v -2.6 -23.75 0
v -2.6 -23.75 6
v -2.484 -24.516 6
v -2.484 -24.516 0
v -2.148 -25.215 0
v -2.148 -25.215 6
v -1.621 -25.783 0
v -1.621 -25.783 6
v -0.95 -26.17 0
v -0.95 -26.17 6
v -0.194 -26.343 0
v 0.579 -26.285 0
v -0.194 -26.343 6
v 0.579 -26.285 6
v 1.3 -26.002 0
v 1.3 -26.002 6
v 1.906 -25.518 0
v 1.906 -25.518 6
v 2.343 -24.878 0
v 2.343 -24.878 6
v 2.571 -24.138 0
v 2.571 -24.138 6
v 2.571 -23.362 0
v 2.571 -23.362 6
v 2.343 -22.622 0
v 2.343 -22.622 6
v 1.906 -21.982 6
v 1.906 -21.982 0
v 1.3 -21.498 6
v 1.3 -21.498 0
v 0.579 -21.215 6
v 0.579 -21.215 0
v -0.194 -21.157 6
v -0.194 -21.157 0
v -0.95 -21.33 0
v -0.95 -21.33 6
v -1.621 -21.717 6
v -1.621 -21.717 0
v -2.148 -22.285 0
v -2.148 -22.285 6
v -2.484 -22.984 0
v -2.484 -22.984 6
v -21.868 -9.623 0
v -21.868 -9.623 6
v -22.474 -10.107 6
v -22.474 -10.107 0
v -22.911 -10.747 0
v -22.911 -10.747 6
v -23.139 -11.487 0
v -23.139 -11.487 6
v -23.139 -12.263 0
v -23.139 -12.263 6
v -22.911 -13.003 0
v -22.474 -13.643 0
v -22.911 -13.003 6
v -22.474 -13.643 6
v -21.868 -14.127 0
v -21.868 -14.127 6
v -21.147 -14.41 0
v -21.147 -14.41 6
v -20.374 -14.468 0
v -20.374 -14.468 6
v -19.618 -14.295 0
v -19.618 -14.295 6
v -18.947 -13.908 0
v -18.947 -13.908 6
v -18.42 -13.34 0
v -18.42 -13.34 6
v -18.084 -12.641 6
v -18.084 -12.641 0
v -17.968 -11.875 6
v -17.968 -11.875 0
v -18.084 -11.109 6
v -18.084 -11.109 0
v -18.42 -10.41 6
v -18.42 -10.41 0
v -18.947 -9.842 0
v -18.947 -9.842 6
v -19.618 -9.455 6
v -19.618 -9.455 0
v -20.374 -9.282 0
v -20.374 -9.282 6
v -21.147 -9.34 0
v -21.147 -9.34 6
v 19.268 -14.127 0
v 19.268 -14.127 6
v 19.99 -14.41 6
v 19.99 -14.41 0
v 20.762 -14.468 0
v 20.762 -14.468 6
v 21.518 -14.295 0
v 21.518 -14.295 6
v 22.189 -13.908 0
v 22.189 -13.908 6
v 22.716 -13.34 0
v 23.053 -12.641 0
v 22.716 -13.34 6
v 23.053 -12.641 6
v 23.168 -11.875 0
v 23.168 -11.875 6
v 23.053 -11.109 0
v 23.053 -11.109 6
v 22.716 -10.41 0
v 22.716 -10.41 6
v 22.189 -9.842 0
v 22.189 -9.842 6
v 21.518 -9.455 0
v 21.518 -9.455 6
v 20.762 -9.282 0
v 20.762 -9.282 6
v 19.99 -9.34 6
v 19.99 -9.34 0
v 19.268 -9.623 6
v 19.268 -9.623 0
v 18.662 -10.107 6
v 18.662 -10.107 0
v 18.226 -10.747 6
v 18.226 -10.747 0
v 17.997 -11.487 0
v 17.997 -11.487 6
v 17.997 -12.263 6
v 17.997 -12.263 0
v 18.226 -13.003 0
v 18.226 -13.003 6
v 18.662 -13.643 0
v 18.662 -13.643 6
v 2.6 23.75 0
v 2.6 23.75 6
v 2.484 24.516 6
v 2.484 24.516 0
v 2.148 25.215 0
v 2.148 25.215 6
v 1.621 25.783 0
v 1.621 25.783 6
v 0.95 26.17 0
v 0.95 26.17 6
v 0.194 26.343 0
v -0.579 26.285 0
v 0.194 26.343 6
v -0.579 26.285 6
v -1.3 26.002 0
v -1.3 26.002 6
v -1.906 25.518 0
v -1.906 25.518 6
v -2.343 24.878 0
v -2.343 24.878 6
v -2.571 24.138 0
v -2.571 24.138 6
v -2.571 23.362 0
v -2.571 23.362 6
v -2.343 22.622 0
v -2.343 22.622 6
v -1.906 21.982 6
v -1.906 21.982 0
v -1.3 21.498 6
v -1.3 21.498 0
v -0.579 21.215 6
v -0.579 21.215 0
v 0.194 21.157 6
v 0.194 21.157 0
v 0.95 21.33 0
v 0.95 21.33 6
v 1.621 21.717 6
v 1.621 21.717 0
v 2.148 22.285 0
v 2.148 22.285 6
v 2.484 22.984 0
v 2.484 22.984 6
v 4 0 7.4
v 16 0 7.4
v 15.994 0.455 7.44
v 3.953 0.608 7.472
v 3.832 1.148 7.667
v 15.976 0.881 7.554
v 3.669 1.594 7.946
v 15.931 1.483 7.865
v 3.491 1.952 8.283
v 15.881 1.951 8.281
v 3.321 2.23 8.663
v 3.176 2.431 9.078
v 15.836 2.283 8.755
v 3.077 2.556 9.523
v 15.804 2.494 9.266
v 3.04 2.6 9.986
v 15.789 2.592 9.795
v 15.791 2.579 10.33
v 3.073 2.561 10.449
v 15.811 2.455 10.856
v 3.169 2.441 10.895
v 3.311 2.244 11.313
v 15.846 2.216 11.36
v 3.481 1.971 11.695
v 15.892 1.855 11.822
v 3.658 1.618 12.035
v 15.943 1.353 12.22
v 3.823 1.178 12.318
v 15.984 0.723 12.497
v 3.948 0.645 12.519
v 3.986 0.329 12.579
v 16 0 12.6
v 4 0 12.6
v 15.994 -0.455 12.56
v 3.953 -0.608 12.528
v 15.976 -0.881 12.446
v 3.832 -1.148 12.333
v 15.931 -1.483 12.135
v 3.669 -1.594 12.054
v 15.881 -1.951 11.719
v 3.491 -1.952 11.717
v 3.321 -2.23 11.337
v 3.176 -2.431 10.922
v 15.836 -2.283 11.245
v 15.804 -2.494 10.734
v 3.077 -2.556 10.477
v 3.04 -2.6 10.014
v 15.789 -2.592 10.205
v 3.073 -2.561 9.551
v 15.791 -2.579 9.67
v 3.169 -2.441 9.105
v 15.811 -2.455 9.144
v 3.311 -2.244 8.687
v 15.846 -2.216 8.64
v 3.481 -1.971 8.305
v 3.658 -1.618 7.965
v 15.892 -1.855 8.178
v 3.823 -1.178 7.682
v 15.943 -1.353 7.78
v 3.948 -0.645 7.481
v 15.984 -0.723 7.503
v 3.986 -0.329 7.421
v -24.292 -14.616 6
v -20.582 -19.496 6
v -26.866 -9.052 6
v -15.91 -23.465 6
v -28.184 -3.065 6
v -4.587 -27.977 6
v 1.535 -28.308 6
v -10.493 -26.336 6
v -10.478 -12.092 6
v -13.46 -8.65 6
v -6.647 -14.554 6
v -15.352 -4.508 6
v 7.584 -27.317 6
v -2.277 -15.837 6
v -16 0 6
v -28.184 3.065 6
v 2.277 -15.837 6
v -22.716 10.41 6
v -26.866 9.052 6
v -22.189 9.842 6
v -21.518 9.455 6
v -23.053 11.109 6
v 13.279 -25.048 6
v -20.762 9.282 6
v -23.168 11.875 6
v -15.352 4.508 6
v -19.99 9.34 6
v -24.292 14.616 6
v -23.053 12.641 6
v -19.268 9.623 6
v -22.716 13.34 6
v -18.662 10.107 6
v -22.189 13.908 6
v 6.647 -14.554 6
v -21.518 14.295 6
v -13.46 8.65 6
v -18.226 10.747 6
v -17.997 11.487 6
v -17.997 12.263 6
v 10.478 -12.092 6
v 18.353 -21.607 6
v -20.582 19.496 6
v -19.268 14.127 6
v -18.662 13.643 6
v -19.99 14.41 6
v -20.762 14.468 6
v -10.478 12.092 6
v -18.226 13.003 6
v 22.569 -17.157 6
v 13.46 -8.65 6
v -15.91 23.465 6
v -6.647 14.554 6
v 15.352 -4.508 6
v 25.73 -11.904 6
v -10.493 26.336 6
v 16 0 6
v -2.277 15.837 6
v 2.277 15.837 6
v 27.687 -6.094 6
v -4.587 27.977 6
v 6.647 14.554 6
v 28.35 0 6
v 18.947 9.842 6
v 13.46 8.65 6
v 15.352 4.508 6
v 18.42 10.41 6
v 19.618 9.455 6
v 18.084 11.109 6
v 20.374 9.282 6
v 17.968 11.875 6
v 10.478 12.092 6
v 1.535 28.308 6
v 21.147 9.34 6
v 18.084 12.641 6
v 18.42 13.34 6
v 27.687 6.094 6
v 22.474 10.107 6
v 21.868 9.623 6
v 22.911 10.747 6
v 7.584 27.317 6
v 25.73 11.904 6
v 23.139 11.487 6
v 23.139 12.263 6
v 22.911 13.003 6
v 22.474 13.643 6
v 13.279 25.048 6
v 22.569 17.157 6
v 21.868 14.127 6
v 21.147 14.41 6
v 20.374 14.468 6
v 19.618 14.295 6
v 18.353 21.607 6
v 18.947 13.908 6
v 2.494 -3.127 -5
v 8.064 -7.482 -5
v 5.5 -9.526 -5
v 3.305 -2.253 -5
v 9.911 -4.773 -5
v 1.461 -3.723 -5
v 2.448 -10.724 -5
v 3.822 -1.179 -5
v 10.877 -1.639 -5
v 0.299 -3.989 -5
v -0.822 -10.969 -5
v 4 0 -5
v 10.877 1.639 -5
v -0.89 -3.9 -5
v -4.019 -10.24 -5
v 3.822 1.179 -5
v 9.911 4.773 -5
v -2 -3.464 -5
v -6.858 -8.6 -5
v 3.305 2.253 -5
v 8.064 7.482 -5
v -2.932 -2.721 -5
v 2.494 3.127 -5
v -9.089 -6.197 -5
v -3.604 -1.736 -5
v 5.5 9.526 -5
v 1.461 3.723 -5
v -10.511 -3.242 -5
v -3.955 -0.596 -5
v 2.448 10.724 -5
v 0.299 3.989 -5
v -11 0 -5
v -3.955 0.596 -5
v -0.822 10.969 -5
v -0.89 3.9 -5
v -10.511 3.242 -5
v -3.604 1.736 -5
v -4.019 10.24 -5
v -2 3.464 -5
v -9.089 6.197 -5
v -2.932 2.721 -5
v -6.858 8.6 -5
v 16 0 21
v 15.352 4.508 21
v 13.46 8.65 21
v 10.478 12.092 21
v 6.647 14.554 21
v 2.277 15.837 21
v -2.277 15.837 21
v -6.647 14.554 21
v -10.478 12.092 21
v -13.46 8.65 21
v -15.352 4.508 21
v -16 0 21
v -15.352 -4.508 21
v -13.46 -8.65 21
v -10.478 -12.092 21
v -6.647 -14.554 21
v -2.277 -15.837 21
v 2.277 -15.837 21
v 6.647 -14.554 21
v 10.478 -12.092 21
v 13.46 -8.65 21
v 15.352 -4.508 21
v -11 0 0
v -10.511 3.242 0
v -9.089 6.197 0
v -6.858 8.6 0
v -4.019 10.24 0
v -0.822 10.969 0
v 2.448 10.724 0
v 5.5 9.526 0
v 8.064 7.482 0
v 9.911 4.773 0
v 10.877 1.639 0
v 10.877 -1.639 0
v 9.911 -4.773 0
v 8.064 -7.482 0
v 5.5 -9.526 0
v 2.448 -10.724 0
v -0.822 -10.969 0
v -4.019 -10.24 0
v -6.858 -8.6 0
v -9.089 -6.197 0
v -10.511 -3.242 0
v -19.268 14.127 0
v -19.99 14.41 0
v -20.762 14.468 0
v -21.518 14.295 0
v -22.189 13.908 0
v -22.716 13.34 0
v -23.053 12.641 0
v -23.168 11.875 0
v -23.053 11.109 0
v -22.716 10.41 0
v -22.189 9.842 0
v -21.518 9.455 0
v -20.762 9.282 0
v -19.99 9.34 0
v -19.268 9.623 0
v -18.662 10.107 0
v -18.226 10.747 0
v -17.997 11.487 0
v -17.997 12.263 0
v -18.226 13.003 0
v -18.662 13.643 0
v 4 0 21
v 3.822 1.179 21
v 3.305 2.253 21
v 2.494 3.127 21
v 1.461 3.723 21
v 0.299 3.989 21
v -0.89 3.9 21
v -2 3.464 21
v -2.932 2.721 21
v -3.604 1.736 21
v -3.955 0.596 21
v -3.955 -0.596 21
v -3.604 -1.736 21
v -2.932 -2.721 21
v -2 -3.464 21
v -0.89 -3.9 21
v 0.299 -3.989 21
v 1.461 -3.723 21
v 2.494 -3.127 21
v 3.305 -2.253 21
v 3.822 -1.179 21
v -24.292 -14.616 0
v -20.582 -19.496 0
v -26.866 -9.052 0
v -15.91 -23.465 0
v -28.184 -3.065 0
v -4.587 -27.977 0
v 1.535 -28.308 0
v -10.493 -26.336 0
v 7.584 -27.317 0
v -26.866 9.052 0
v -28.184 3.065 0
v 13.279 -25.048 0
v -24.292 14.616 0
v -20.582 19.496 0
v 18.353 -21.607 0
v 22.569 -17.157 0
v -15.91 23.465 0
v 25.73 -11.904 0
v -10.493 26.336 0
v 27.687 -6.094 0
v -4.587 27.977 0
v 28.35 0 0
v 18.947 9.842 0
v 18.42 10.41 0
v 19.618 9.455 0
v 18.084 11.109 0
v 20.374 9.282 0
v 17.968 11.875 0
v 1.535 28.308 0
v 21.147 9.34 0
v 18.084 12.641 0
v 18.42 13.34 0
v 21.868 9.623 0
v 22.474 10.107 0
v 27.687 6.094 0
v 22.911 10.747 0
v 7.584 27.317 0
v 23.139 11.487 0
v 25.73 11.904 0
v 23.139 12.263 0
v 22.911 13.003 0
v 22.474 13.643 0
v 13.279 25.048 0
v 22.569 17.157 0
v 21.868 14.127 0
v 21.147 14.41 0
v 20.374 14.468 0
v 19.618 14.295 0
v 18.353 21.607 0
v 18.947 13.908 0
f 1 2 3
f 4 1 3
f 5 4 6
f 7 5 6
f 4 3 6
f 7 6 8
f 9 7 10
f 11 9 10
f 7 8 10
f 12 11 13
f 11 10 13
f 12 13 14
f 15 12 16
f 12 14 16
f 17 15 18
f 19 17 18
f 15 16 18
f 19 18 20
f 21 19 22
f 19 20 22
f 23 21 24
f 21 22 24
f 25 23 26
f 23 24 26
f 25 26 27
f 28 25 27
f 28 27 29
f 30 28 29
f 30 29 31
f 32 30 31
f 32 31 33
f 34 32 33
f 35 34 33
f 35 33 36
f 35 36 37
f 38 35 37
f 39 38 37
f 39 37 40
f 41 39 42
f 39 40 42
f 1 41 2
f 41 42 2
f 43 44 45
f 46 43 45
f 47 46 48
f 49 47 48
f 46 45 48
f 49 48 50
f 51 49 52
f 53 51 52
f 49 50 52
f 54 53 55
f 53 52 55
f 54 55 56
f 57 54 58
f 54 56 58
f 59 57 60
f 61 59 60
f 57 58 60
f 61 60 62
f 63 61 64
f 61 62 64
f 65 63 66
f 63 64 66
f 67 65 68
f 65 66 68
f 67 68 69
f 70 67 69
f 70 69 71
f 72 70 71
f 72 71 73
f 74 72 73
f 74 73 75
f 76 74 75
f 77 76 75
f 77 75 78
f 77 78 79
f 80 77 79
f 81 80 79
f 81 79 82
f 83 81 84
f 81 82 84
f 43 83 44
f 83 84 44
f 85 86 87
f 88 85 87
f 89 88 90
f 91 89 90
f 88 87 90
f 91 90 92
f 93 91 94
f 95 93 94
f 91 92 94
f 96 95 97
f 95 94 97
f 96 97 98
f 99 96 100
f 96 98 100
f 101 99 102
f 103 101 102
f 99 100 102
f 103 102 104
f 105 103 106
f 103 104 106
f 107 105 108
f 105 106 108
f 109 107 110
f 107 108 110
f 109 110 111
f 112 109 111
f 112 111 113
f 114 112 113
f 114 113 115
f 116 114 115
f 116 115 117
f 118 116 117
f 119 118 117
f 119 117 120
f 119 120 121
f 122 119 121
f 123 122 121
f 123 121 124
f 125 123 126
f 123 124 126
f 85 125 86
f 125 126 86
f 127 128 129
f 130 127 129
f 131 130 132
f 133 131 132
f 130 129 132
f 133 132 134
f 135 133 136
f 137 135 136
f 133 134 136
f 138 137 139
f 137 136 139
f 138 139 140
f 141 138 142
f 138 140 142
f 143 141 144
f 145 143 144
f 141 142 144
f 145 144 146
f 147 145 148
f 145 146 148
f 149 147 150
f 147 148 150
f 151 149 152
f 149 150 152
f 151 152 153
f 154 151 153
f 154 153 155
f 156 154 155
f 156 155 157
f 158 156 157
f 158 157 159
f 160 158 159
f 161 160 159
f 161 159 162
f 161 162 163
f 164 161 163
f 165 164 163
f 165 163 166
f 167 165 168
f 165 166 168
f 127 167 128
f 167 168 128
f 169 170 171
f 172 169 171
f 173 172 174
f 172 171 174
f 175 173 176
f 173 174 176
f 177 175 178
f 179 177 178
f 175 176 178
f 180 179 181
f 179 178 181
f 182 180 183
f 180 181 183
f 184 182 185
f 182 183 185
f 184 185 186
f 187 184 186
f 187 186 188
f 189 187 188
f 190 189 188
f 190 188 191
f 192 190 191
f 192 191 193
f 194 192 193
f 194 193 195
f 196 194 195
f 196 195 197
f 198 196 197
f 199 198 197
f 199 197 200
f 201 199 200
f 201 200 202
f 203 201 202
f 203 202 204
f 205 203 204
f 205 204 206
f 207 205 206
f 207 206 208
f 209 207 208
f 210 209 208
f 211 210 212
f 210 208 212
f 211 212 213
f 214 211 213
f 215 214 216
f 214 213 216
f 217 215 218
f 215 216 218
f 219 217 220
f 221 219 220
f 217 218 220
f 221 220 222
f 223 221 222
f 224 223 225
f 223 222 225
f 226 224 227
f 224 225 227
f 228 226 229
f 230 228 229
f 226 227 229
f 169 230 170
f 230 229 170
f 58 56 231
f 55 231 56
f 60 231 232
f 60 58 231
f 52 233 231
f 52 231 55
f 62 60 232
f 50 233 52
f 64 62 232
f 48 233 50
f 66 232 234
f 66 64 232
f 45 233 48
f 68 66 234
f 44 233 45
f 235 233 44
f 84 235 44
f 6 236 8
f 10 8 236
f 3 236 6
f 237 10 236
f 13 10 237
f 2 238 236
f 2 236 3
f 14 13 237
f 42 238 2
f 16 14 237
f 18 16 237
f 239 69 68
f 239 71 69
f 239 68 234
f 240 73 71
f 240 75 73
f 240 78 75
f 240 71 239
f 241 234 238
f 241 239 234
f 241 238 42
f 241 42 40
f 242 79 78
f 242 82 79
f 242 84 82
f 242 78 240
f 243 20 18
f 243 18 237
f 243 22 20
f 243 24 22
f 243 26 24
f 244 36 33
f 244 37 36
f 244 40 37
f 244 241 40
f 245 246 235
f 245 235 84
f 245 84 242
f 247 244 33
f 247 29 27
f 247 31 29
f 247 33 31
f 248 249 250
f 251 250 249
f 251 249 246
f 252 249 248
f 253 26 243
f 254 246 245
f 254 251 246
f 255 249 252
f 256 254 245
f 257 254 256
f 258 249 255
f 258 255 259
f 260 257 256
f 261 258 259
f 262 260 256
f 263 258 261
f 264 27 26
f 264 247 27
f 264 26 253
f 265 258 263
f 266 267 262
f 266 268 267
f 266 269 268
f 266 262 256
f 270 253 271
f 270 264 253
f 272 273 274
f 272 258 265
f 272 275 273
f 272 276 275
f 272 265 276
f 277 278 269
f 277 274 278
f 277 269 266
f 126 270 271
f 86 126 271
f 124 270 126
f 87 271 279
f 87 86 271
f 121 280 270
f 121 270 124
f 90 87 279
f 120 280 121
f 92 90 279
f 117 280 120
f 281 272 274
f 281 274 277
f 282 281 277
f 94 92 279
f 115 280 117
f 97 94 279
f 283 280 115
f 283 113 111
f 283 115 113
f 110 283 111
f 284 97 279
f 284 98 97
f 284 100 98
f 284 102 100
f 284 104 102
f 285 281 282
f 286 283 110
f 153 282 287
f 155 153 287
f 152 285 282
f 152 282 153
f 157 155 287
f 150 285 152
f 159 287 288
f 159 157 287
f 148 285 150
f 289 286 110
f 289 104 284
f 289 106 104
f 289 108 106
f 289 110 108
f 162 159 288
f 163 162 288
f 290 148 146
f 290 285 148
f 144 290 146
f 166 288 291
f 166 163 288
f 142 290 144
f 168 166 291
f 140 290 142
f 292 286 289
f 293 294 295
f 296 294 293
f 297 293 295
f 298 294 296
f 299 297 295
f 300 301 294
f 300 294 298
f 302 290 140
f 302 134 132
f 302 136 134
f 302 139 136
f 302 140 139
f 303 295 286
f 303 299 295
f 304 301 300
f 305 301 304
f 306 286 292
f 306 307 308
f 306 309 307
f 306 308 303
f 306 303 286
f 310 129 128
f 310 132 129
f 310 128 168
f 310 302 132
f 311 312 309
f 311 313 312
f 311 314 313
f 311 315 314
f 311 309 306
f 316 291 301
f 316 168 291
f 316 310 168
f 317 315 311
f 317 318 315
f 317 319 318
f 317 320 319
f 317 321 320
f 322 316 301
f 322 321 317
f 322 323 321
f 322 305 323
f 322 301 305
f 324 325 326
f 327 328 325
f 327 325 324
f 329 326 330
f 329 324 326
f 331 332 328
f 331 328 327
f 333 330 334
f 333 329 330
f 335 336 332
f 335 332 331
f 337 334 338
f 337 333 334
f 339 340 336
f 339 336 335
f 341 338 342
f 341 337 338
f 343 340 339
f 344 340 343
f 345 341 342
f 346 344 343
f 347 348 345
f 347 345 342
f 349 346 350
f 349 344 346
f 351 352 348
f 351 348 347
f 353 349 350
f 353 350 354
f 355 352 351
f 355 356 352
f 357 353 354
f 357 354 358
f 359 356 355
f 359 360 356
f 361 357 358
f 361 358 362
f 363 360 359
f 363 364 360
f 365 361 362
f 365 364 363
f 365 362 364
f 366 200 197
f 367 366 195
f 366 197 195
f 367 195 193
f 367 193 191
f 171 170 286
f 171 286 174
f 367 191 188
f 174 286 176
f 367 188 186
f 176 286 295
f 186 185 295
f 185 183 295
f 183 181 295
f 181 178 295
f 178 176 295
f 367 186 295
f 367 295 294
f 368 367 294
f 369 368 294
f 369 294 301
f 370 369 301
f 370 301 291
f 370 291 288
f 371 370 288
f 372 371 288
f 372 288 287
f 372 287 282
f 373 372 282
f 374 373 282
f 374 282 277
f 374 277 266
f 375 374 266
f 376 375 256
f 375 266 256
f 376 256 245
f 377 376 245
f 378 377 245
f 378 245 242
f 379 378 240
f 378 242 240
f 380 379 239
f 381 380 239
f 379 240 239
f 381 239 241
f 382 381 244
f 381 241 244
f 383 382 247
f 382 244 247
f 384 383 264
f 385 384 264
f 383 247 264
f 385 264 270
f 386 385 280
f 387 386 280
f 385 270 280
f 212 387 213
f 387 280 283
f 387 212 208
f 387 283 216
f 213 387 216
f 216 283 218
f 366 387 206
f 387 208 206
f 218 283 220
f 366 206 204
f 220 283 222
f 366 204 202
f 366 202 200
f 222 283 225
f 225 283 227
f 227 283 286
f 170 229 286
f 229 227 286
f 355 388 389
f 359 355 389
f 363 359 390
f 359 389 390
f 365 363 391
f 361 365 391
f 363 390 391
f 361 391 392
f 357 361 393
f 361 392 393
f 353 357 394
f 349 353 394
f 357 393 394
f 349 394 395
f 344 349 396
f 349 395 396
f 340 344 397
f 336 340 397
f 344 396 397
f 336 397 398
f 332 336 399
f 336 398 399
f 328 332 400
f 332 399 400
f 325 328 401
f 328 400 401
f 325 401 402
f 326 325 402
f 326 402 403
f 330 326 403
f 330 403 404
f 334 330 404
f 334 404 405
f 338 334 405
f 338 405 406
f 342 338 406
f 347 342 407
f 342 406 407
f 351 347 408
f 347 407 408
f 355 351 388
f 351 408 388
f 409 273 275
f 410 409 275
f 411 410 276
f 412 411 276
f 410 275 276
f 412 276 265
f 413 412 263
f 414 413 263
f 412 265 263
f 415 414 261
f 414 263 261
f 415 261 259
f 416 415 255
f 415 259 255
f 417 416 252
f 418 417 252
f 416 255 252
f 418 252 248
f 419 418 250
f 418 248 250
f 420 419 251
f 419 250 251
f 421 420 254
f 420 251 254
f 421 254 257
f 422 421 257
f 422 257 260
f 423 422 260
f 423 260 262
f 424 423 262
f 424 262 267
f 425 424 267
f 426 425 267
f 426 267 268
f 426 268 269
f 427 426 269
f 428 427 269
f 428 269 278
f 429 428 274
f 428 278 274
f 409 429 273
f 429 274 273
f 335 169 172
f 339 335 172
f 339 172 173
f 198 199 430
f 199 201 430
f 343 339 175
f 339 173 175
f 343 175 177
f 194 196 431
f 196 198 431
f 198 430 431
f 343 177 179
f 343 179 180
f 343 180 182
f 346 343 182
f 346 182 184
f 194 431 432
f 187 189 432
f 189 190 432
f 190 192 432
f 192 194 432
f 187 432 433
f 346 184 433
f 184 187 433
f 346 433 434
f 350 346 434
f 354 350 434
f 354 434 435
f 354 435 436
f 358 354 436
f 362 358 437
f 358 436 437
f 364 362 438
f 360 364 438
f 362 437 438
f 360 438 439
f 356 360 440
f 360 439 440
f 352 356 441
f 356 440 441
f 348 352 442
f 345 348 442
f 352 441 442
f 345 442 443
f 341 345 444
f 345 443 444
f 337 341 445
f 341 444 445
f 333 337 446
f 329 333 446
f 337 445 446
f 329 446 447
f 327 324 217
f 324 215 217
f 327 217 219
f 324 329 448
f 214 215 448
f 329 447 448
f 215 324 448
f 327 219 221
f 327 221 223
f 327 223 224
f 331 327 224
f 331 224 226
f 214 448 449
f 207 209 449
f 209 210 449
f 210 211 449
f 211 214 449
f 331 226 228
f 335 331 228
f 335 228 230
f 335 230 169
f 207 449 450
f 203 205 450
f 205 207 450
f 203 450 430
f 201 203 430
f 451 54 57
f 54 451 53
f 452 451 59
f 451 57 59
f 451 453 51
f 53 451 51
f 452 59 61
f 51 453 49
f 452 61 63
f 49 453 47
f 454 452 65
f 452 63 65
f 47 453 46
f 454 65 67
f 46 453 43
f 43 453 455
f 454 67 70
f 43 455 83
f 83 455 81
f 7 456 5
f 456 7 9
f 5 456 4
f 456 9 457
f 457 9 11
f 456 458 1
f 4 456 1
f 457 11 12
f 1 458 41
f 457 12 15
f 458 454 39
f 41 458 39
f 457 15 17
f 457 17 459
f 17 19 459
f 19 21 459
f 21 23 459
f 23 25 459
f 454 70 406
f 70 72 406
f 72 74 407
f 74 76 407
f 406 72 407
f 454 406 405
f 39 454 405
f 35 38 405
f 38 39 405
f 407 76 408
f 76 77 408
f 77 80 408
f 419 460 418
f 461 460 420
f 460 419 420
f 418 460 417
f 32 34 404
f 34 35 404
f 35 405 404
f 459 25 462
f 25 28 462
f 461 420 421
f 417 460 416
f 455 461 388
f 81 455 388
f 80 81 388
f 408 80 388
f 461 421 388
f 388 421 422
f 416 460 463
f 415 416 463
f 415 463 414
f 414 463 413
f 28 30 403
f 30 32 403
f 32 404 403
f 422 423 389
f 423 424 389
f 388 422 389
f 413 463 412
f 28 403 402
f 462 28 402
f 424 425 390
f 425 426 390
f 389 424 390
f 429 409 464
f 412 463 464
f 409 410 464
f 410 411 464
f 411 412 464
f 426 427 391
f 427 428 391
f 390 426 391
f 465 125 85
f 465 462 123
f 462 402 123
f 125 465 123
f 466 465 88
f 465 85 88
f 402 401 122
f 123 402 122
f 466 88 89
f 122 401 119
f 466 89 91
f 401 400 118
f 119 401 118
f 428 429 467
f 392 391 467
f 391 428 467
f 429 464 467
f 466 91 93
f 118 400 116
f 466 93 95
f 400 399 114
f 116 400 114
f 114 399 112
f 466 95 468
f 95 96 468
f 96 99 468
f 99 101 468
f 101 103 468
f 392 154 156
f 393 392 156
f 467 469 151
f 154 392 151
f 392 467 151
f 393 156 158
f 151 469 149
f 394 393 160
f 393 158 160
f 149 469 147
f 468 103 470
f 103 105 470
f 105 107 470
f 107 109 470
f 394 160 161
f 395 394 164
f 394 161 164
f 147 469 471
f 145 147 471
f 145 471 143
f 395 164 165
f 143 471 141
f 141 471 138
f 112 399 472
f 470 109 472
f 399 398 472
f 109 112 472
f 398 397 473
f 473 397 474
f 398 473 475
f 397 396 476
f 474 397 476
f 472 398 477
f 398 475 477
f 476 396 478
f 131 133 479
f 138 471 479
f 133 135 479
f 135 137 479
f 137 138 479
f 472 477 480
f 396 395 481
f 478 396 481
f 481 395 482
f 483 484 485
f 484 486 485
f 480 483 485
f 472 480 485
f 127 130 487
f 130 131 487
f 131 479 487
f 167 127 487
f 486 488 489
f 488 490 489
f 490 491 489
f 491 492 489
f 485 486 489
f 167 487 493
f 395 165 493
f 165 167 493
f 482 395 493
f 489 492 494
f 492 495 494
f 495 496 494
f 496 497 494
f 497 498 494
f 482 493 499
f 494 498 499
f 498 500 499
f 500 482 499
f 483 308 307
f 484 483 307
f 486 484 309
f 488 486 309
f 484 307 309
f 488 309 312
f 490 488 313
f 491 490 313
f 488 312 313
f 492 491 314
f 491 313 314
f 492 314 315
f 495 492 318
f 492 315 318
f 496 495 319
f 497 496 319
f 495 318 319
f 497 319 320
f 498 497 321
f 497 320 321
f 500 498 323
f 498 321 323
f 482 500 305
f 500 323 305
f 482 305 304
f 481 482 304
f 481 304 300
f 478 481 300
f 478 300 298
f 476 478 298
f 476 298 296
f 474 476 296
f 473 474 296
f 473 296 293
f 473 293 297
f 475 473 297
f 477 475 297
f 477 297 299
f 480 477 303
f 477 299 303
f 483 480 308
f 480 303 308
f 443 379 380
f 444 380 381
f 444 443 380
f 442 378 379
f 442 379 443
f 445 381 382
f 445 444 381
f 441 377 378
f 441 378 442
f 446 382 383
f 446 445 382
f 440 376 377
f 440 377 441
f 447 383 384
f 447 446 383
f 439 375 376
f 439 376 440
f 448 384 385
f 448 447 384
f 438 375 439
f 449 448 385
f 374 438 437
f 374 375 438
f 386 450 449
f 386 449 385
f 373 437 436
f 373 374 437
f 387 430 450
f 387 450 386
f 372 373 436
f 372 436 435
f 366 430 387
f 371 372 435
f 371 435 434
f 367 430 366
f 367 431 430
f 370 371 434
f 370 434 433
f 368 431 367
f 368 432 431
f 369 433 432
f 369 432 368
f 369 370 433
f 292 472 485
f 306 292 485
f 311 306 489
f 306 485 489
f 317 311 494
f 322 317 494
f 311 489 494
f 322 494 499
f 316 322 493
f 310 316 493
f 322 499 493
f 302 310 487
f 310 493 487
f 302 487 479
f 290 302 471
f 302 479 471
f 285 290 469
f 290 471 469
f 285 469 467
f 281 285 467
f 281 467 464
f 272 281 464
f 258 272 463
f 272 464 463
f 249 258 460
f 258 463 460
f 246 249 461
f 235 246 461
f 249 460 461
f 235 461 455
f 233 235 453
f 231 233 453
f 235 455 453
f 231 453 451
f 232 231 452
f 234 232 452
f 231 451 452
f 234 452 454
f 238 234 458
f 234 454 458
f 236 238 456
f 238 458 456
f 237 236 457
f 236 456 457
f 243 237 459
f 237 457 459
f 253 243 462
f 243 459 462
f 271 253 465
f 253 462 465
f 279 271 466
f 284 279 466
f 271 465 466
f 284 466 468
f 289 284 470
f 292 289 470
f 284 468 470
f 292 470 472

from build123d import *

# Parameters (mm, degrees)
SKETCH_1_R               = 28.35
EXTRUDE_1_DEPTH          = 6
SKETCH_2_R               = 16
EXTRUDE_2_DEPTH          = 15
SKETCH_7_R               = 11
EXTRUDE_3_DEPTH          = 5
SKETCH_3_R               = 4
CUT_EXTRUDE_1_DEPTH      = 48.785405722
CUT_EXTRUDE_2_REACH      = 44.807
SKETCH_4_R               = 2.6
PATTERN_CIRCULAR_1_COUNT = 6
CUT_EXTRUDE_3_REACH      = 58.671
SKETCH_6_R               = 2.6


with BuildPart() as part:
    # 草圖1 → 填料-伸長1 (new body)
    with BuildSketch(Plane.XY):
        Circle(SKETCH_1_R)
    extrude(amount=EXTRUDE_1_DEPTH)

    # 草圖2 → 填料-伸長2 (add)
    with BuildSketch(Plane.XY.offset(6)):
        Circle(SKETCH_2_R)
    extrude(amount=EXTRUDE_2_DEPTH)

    # 草圖7 → 填料-伸長3 (add)
    with BuildSketch(Plane(origin=(0, 0, 0), x_dir=(-1, 0, 0), z_dir=(0, 0, -1))):
        Circle(SKETCH_7_R)
    extrude(amount=EXTRUDE_3_DEPTH)

    # 草圖3 → 除料-伸長1 (cut, through all)
    with BuildSketch(Plane.XY.offset(21)):
        Circle(SKETCH_3_R)
    extrude(amount=-CUT_EXTRUDE_1_DEPTH, mode=Mode.SUBTRACT)

    # 草圖4 → 除料-伸長2 (cut, up to next)
    with BuildSketch(Plane.XY.offset(6), mode=Mode.PRIVATE) as cut_extrude_2_sk1:
        with Locations((0, 23.75)):
            Circle(SKETCH_4_R)
    cut_extrude_2_tool1 = extrude(cut_extrude_2_sk1.sketch, amount=-CUT_EXTRUDE_2_REACH, mode=Mode.PRIVATE) & part.part
    cut_extrude_2 = cut_extrude_2_tool1.solids().sort_by_distance((0, 23.75, 6))[0]
    add(cut_extrude_2, mode=Mode.SUBTRACT)

    # 環狀複製排列1: 除料-伸長2 ×6 about axis
    pattern_circular_1_axis = Axis((0, 0, 6), (0, 0, 1))
    for i in range(1, PATTERN_CIRCULAR_1_COUNT):
        add(cut_extrude_2.rotate(pattern_circular_1_axis, i * 360 / PATTERN_CIRCULAR_1_COUNT), mode=Mode.SUBTRACT)

    # 草圖6 → 除料-伸長3 (cut, up to next)
    with BuildSketch(Plane(origin=(16, 0, 0), x_dir=(0, 0, -1), z_dir=(1, 0, 0)), mode=Mode.PRIVATE) as cut_extrude_3_sk1:
        with Locations((-10, 0)):
            Circle(SKETCH_6_R)
    cut_extrude_3_tool1 = extrude(cut_extrude_3_sk1.sketch, amount=-CUT_EXTRUDE_3_REACH, mode=Mode.PRIVATE) & part.part
    add(cut_extrude_3_tool1.solids().sort_by_distance((16, 0, 10))[0], mode=Mode.SUBTRACT)


solid = part.part
